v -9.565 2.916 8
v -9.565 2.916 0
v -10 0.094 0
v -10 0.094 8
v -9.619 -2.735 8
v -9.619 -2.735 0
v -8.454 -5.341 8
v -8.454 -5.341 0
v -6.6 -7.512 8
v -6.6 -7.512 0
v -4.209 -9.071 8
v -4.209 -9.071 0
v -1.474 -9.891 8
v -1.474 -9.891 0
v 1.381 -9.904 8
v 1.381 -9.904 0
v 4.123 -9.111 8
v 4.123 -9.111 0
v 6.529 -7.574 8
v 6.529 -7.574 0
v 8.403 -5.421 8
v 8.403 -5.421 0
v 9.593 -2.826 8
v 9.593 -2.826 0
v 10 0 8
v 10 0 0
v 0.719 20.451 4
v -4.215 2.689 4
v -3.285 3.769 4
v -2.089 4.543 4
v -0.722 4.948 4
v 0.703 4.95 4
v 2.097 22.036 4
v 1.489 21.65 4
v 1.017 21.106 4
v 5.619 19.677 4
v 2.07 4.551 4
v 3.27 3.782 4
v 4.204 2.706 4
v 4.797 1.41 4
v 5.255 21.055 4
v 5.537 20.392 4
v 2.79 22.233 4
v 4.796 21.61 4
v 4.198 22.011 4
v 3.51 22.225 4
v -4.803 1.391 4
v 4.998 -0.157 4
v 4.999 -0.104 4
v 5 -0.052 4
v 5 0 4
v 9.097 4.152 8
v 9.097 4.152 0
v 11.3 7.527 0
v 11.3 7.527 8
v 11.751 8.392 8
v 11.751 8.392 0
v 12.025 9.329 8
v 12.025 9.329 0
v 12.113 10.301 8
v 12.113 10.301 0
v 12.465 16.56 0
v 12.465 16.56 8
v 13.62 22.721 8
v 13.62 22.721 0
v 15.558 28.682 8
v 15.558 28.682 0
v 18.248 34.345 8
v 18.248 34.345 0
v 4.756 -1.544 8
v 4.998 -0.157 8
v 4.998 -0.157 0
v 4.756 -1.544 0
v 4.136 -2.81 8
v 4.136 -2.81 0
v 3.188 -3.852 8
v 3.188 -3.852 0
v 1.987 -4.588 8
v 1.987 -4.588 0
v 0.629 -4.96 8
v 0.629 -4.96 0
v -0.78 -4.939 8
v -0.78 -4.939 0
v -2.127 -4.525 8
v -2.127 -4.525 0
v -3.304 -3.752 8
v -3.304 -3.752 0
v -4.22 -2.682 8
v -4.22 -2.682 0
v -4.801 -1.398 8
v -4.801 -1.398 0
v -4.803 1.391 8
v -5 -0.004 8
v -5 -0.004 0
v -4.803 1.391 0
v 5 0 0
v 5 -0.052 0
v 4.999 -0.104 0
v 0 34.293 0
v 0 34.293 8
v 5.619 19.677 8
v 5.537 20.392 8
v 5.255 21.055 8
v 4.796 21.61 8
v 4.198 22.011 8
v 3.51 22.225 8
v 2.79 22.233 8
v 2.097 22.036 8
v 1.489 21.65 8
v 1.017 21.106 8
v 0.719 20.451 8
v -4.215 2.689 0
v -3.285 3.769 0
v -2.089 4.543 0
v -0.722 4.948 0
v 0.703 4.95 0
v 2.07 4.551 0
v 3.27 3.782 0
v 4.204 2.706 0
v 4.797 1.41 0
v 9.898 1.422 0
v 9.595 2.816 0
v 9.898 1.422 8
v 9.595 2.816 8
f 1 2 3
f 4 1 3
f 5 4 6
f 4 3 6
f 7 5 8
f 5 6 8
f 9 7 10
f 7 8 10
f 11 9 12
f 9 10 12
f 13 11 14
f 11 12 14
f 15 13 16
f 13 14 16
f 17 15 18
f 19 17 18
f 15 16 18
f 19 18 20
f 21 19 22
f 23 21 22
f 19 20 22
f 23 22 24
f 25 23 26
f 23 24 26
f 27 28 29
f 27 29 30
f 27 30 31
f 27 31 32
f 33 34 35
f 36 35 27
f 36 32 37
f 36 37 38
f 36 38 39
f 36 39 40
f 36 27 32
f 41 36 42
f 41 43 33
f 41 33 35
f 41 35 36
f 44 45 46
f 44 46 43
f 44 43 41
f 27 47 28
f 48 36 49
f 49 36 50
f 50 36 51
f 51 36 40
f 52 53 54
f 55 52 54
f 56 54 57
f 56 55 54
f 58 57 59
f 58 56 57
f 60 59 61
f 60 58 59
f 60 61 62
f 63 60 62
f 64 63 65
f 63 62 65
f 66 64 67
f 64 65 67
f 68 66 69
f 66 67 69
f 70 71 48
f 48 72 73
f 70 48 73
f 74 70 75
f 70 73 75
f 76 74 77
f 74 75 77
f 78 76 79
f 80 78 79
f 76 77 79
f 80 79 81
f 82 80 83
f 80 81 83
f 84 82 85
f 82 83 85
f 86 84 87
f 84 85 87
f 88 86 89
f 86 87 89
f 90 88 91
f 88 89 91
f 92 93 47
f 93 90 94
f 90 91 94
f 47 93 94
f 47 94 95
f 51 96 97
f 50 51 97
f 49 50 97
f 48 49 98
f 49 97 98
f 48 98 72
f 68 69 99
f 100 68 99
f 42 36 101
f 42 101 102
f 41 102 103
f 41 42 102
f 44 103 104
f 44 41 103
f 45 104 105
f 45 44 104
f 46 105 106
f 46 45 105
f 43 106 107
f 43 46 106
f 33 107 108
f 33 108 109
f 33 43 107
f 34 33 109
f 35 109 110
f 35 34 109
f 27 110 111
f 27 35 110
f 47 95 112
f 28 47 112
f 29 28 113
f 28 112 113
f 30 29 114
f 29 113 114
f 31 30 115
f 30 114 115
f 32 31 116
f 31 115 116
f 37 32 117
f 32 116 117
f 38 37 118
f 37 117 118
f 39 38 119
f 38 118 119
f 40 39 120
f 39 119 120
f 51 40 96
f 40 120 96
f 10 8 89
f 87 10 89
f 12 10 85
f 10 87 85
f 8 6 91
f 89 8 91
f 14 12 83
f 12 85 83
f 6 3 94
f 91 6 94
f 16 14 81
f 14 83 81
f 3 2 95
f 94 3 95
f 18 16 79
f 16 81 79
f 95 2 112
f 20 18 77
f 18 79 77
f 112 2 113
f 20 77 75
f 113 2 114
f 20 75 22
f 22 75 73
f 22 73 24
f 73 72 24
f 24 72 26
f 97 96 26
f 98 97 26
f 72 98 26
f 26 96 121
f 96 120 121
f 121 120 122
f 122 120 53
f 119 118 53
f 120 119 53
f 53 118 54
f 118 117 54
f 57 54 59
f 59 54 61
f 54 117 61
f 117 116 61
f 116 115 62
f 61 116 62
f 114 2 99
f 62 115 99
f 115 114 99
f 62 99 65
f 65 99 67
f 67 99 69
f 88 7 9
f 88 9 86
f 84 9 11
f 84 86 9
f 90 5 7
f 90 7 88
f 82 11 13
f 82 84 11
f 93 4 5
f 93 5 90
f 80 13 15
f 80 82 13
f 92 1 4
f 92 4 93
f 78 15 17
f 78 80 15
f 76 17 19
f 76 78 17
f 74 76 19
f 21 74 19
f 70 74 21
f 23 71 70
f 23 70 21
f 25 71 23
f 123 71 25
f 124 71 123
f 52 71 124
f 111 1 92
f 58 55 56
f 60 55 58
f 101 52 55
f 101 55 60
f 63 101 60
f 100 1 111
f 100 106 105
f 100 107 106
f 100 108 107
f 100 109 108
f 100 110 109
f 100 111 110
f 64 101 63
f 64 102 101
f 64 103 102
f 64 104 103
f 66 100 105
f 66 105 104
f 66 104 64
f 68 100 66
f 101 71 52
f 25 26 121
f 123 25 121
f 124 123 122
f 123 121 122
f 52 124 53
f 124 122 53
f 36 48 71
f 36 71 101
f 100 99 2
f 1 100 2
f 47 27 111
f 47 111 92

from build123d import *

# Parameters (mm, degrees)
SKETCH1_R           = 2.5
BOSS_EXTRUDE1_DEPTH = 8
CUT_EXTRUDE1_START  = 4
CUT_EXTRUDE1_DEPTH  = 4
FILLET1_R           = 5


with BuildPart() as part:
    # Sketch1 → Boss-Extrude1 (new body)
    with BuildSketch(Plane.XY):
        with BuildLine():
            ThreePointArc((9.097153376, 4.152324704), (7.50458322, 6.609177763), (5.268689672, 8.499465227))
            Line((5.268689672, 8.499465227), (4.99754882, -0.156543244))
            ThreePointArc((4.99754882, -0.156543244), (-0.780009037, -4.938783848), (-4.802546561, 1.391239206))
            Line((-4.802546561, 1.391239206), (-2.392849571, 9.709493855))
            ThreePointArc((-2.392849571, 9.709493855), (-6.876600935, 7.260327787), (-9.565391616, 2.916038962))
            ThreePointArc((-9.565391616, 2.916038962), (-1.474124119, -9.890751138), (10, 0))
            ThreePointArc((10, 0), (9.771681886, 2.124672473), (9.097153376, 4.152324704))
        make_face()
        with BuildLine():
            Line((4.99754882, -0.156543244), (5.268689672, 8.499465227))
            ThreePointArc((5.268689672, 8.499465227), (1.560018074, 9.877567697), (-2.392849571, 9.709493855))
            Line((-2.392849571, 9.709493855), (-4.802546561, 1.391239206))
            ThreePointArc((-4.802546561, 1.391239206), (0.702590633, 4.95039053), (5, 0))
            ThreePointArc((5, 0), (4.999387168, -0.078281216), (4.99754882, -0.156543244))
        make_face()
        with BuildLine():
            ThreePointArc((5.620036149, 19.755135394), (5.619729732, 19.715994786), (5.618810559, 19.676863772))
            Line((5.618810559, 19.676863772), (5.268689672, 8.499465227))
            ThreePointArc((5.268689672, 8.499465227), (7.50458322, 6.609177763), (9.097153376, 4.152324704))
            Line((9.097153376, 4.152324704), (12.147237195, 8.825258116))
            ThreePointArc((12.147237195, 8.825258116), (13.442669974, 22.004389763), (18.247609257, 34.344576778))
            Line((18.247609257, 34.344576778), (0, 34.293094604))
            Line((0, 34.293094604), (-9.565391616, 2.916038962))
            ThreePointArc((-9.565391616, 2.916038962), (-6.876600935, 7.260327787), (-2.392849571, 9.709493855))
            Line((-2.392849571, 9.709493855), (0.718762868, 20.450754997))
            ThreePointArc((0.718762868, 20.450754997), (3.471331465, 22.230330659), (5.620036149, 19.755135394))
        make_face()
        with BuildLine():
            Line((5.268689672, 8.499465227), (5.618810559, 19.676863772))
            ThreePointArc((5.618810559, 19.676863772), (2.73003163, 17.28574347), (0.718762868, 20.450754997))
            Line((0.718762868, 20.450754997), (-2.392849571, 9.709493855))
            ThreePointArc((-2.392849571, 9.709493855), (1.560018074, 9.877567697), (5.268689672, 8.499465227))
        make_face()
        with Locations((3.120036149, 19.755135394)):
            Circle(SKETCH1_R)
    extrude(amount=BOSS_EXTRUDE1_DEPTH)

    # Sketch1<3> → Cut-Extrude1 (cut)
    with BuildSketch(Plane.XY.offset(CUT_EXTRUDE1_START)):
        with BuildLine():
            ThreePointArc((5.618810559, 19.676863772), (3.510040667, 22.224527318), (0.718762868, 20.450754997))
            Line((0.718762868, 20.450754997), (-4.802546561, 1.391239206))
            ThreePointArc((-4.802546561, 1.391239206), (0.780009037, 4.938783848), (4.99754882, -0.156543244))
            Line((4.99754882, -0.156543244), (5.618810559, 19.676863772))
        make_face()
    extrude(amount=CUT_EXTRUDE1_DEPTH, mode=Mode.SUBTRACT)

    # Fillet1
    fillet1_edges = [part.edges().sort_by_distance(p)[0] for p in [
        (12.147237195, 8.825258116, 4),
    ]]
    fillet(fillet1_edges, radius=FILLET1_R)


solid = part.part
